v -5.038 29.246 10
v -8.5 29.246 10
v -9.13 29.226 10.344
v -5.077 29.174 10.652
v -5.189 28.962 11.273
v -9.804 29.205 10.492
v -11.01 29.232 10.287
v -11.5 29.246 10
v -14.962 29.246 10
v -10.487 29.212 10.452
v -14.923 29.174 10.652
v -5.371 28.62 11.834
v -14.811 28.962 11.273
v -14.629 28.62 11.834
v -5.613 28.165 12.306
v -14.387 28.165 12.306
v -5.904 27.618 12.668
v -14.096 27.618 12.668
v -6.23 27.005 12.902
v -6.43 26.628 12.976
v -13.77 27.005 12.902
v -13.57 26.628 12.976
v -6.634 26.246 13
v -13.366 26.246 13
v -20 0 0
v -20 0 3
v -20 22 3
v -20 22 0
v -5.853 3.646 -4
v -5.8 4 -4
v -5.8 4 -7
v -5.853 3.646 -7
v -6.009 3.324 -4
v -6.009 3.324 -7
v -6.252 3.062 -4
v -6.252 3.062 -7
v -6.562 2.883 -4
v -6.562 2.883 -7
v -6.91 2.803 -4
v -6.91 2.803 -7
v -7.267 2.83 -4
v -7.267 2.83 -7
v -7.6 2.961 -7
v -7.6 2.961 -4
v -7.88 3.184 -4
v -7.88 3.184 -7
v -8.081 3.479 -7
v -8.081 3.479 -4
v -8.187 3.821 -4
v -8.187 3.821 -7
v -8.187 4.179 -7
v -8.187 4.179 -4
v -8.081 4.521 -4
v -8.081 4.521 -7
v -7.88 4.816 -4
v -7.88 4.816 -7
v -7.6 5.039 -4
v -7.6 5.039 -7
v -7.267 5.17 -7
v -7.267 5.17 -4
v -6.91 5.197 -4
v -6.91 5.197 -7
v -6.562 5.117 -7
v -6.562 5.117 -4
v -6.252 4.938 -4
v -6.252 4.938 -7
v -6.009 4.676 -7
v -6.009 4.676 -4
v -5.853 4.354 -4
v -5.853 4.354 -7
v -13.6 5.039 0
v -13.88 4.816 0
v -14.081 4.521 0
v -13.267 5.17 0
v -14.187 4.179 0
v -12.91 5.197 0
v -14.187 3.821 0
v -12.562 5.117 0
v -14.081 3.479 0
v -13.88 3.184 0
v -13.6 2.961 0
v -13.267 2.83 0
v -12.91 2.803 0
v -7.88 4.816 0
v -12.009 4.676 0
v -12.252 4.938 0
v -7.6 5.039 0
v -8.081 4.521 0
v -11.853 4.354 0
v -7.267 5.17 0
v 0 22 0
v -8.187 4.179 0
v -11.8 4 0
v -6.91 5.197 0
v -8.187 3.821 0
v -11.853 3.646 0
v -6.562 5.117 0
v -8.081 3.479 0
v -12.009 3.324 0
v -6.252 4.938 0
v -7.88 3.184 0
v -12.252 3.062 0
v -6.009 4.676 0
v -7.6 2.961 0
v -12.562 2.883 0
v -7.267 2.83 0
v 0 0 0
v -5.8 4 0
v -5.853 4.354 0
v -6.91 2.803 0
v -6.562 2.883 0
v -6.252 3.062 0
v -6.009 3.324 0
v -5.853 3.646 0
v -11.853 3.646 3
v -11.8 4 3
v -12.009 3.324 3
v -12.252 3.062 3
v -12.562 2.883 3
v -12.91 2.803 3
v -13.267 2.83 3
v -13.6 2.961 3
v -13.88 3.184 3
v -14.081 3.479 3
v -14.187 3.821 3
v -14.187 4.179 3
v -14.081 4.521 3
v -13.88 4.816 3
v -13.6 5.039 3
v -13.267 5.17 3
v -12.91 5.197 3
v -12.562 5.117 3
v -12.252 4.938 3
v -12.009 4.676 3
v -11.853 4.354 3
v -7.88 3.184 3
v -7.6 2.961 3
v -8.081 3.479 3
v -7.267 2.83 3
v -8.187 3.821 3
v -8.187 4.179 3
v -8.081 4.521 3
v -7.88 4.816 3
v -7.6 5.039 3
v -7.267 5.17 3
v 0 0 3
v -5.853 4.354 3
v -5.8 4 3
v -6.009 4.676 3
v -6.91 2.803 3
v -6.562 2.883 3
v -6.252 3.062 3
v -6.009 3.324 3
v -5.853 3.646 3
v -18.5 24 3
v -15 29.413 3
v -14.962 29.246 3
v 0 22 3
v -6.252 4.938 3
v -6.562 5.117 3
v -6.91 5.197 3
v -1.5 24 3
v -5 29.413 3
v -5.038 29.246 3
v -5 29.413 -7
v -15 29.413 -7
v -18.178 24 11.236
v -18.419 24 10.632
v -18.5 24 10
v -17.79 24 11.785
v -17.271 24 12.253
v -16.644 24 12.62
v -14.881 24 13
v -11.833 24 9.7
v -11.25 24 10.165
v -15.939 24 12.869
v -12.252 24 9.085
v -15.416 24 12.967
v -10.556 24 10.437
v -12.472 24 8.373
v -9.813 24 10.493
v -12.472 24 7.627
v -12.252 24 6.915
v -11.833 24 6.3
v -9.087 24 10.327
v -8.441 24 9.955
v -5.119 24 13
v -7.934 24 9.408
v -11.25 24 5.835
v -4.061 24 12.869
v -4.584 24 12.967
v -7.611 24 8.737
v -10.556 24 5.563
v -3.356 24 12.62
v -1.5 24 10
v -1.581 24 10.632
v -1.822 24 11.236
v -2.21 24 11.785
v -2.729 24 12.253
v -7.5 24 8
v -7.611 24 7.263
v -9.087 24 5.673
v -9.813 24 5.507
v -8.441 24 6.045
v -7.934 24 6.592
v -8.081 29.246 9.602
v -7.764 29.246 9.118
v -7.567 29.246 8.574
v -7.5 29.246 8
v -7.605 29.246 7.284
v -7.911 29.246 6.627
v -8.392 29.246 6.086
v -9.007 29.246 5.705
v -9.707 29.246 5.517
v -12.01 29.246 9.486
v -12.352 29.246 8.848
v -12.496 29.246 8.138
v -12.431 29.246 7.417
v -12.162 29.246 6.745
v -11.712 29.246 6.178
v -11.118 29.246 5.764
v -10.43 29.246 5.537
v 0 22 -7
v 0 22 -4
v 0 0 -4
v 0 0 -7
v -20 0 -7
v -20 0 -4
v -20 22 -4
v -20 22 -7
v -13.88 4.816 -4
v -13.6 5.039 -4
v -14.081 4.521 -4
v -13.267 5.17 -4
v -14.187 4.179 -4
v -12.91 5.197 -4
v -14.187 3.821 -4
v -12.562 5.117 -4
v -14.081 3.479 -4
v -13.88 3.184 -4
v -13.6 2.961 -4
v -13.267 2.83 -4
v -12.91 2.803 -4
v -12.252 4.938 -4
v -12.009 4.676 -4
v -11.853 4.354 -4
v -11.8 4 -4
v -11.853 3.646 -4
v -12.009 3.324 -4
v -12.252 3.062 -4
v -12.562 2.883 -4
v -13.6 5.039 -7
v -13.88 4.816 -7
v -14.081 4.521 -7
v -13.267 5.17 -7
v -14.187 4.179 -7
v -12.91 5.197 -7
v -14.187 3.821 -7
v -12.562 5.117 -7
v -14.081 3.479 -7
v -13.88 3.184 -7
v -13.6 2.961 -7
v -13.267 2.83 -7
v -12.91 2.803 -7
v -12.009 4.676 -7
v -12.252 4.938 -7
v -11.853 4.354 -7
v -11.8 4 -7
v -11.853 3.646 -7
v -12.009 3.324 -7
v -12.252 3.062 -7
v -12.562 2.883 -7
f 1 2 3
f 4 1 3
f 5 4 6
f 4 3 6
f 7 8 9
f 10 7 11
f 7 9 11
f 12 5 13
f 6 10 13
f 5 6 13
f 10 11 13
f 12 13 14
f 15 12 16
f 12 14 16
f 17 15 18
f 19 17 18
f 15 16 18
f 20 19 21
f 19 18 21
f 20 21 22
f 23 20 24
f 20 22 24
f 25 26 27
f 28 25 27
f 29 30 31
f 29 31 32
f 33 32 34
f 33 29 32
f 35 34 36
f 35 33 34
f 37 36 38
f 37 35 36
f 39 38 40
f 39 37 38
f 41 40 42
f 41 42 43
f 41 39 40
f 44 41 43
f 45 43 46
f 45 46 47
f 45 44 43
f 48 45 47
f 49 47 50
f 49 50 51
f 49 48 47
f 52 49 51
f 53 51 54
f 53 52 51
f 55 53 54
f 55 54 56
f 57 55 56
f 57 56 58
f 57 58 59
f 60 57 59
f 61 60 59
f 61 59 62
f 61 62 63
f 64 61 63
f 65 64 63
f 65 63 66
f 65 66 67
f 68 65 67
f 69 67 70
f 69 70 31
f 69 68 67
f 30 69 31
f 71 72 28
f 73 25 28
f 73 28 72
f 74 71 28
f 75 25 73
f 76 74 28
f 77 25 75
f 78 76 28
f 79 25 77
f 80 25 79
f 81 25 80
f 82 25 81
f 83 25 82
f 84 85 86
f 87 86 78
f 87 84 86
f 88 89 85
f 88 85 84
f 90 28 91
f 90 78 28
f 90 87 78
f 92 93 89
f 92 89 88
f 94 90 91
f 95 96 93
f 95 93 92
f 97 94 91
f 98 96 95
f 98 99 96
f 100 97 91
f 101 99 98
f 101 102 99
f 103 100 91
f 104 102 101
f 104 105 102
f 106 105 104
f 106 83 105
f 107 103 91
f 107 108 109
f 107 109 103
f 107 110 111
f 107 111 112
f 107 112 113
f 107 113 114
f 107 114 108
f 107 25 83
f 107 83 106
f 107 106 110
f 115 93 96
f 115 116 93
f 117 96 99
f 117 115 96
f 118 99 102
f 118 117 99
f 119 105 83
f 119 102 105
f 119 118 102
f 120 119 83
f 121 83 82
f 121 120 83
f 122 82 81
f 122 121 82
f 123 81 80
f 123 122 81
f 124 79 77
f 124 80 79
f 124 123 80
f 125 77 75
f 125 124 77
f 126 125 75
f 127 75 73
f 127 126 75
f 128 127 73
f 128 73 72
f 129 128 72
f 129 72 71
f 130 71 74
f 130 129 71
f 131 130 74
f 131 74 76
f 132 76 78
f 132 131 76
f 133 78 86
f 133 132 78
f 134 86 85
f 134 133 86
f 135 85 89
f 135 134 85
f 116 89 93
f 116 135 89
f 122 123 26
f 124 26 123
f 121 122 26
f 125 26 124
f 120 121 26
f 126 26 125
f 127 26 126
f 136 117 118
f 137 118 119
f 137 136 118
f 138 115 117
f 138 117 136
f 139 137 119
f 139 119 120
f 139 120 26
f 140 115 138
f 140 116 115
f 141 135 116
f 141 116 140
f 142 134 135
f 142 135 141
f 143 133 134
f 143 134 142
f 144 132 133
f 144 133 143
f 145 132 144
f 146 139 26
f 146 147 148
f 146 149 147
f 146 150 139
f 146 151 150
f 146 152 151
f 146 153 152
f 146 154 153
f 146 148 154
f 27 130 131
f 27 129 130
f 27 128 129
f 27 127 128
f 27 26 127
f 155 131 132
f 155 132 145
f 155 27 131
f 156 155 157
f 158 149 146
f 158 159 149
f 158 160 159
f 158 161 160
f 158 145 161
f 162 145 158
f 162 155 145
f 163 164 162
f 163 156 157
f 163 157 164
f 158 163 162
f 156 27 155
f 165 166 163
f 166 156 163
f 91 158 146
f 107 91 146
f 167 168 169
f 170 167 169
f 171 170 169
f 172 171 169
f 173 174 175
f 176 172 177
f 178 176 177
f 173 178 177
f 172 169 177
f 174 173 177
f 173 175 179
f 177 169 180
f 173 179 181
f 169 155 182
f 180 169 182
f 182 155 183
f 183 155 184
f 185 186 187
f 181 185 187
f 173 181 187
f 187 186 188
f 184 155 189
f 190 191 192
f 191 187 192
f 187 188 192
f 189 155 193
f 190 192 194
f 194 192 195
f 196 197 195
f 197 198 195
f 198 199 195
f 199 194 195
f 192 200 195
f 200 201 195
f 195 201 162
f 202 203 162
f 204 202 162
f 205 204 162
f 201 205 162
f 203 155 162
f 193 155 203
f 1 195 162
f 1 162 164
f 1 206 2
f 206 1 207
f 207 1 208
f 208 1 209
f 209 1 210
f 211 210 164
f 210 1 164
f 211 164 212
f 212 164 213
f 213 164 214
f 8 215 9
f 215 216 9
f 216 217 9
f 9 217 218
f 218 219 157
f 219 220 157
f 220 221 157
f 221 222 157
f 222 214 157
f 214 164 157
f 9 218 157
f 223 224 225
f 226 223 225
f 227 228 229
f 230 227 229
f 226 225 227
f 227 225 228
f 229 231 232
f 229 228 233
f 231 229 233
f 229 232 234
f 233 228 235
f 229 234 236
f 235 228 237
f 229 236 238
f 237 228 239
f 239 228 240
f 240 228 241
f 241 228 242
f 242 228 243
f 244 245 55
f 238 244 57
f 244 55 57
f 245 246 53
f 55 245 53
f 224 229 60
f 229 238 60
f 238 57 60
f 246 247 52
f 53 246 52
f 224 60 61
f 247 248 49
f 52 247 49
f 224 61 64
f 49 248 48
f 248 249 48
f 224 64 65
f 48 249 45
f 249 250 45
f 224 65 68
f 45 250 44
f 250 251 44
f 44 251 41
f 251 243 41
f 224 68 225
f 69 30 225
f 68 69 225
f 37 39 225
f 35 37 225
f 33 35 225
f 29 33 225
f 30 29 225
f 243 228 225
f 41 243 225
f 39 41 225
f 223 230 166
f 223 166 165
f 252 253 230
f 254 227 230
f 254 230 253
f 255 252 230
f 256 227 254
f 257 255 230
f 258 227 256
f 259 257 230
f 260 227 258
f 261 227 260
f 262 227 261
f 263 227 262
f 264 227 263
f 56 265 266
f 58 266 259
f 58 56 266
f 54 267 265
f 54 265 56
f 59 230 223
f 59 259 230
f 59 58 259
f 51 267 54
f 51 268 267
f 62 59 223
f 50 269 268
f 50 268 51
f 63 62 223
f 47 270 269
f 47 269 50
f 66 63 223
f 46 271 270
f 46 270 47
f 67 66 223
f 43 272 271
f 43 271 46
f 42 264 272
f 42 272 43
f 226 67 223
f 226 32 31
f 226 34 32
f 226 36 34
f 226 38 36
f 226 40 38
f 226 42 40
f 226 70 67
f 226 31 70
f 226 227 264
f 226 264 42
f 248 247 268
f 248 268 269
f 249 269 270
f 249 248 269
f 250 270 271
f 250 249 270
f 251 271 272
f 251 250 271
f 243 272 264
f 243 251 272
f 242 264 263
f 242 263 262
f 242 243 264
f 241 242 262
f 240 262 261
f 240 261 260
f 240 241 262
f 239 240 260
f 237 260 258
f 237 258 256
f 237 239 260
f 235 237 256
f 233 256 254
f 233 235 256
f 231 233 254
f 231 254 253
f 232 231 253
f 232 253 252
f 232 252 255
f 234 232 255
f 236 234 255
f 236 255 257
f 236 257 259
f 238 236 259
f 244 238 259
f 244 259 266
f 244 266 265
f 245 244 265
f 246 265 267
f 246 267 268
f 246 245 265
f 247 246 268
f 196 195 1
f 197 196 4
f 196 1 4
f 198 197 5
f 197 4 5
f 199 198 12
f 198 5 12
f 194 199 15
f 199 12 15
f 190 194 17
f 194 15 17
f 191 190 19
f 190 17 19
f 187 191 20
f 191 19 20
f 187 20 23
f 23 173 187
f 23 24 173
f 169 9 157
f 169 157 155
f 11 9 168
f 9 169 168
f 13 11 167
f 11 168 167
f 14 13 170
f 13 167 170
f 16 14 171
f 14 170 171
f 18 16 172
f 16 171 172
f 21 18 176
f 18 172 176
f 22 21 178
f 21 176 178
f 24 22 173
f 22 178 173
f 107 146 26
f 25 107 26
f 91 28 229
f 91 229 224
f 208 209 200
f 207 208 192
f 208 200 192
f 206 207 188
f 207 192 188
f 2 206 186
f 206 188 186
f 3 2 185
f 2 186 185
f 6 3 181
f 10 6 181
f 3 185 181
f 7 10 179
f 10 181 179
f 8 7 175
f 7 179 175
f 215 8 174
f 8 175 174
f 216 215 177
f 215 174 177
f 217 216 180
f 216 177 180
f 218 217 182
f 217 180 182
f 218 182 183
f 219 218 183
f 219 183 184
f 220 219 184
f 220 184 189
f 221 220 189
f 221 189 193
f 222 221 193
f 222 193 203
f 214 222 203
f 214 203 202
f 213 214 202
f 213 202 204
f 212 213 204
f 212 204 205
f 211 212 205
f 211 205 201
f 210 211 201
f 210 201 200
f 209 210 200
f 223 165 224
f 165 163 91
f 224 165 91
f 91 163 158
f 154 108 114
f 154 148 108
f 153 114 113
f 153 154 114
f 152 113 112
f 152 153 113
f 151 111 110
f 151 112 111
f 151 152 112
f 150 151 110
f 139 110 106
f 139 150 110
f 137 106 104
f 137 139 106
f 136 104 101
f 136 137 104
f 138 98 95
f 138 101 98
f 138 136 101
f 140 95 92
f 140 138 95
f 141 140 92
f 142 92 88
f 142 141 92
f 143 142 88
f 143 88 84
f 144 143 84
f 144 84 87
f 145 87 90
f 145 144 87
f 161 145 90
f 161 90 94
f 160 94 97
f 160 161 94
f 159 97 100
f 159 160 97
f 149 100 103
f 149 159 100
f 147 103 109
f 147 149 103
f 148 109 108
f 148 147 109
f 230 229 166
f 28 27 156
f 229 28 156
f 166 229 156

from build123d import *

# Parameters (mm, degrees)
SKETCH_R        = 1.2
PAD_DEPTH       = 3
PAD001_DEPTH    = 10
FILLET_R        = 3
SKETCH002_R     = 2.5
POCKET_DEPTH    = 6
SKETCH003_R     = 1.2
PAD002_DEPTH    = 7
SKETCH004_W     = 20
SKETCH004_H     = 4
POCKET001_DEPTH = 22


with BuildPart() as part:
    # Sketch → Pad (new body)
    with BuildSketch(Plane.XY):
        Polygon((-20, 22), (-20, 0), (0, 0), (0, 22), (-5, 29.412805), (-15, 29.412805), align=None)
        with Locations((-7, 4)):
            Circle(SKETCH_R, mode=Mode.SUBTRACT)
        with Locations((-13, 4)):
            Circle(SKETCH_R, mode=Mode.SUBTRACT)
    extrude(amount=PAD_DEPTH)

    # Sketch001 (on Face10 of Pad) → Pad001 (join)
    with BuildSketch(Plane.XY.offset(3)):
        Polygon((-10, 24), (-1.5, 24), (-5.038419, 29.245922), (-14.961581, 29.245922), (-18.5, 24), align=None)
    extrude(amount=PAD001_DEPTH)

    # Fillet
    fillet_edges = [part.edges().sort_by_distance(p)[0] for p in [
        (-3.26921, 26.622961, 13),
        (-10, 29.245922, 13),
        (-16.73079, 26.622961, 13),
    ]]
    fillet(fillet_edges, radius=FILLET_R)

    # Sketch002 (on Face1 of Fillet) → Pocket (cut)
    with BuildSketch(Plane.XZ.offset(-24)):
        with Locations((-10, 8)):
            Circle(SKETCH002_R)
    extrude(amount=-POCKET_DEPTH, mode=Mode.SUBTRACT)

    # Sketch003 (on Face20 of Pocket) → Pad002 (join)
    with BuildSketch(Plane(origin=(0, 0, 0), x_dir=(1, 0, 0), z_dir=(0, 0, -1))):
        Polygon((0, 0), (-20, 0), (-20, -22), (-15, -29.412805), (-5, -29.412805), (0, -22), align=None)
        with Locations((-13, -4)):
            Circle(SKETCH003_R, mode=Mode.SUBTRACT)
        with Locations((-7, -4)):
            Circle(SKETCH003_R, mode=Mode.SUBTRACT)
    extrude(amount=PAD002_DEPTH)

    # Sketch004 (on Face22 of Pad002) → Pocket001 (cut)
    with BuildSketch(Plane.XZ):
        with Locations((-10, -2)):
            Rectangle(SKETCH004_W, SKETCH004_H)
    extrude(amount=-POCKET001_DEPTH, mode=Mode.SUBTRACT)


solid = part.part
